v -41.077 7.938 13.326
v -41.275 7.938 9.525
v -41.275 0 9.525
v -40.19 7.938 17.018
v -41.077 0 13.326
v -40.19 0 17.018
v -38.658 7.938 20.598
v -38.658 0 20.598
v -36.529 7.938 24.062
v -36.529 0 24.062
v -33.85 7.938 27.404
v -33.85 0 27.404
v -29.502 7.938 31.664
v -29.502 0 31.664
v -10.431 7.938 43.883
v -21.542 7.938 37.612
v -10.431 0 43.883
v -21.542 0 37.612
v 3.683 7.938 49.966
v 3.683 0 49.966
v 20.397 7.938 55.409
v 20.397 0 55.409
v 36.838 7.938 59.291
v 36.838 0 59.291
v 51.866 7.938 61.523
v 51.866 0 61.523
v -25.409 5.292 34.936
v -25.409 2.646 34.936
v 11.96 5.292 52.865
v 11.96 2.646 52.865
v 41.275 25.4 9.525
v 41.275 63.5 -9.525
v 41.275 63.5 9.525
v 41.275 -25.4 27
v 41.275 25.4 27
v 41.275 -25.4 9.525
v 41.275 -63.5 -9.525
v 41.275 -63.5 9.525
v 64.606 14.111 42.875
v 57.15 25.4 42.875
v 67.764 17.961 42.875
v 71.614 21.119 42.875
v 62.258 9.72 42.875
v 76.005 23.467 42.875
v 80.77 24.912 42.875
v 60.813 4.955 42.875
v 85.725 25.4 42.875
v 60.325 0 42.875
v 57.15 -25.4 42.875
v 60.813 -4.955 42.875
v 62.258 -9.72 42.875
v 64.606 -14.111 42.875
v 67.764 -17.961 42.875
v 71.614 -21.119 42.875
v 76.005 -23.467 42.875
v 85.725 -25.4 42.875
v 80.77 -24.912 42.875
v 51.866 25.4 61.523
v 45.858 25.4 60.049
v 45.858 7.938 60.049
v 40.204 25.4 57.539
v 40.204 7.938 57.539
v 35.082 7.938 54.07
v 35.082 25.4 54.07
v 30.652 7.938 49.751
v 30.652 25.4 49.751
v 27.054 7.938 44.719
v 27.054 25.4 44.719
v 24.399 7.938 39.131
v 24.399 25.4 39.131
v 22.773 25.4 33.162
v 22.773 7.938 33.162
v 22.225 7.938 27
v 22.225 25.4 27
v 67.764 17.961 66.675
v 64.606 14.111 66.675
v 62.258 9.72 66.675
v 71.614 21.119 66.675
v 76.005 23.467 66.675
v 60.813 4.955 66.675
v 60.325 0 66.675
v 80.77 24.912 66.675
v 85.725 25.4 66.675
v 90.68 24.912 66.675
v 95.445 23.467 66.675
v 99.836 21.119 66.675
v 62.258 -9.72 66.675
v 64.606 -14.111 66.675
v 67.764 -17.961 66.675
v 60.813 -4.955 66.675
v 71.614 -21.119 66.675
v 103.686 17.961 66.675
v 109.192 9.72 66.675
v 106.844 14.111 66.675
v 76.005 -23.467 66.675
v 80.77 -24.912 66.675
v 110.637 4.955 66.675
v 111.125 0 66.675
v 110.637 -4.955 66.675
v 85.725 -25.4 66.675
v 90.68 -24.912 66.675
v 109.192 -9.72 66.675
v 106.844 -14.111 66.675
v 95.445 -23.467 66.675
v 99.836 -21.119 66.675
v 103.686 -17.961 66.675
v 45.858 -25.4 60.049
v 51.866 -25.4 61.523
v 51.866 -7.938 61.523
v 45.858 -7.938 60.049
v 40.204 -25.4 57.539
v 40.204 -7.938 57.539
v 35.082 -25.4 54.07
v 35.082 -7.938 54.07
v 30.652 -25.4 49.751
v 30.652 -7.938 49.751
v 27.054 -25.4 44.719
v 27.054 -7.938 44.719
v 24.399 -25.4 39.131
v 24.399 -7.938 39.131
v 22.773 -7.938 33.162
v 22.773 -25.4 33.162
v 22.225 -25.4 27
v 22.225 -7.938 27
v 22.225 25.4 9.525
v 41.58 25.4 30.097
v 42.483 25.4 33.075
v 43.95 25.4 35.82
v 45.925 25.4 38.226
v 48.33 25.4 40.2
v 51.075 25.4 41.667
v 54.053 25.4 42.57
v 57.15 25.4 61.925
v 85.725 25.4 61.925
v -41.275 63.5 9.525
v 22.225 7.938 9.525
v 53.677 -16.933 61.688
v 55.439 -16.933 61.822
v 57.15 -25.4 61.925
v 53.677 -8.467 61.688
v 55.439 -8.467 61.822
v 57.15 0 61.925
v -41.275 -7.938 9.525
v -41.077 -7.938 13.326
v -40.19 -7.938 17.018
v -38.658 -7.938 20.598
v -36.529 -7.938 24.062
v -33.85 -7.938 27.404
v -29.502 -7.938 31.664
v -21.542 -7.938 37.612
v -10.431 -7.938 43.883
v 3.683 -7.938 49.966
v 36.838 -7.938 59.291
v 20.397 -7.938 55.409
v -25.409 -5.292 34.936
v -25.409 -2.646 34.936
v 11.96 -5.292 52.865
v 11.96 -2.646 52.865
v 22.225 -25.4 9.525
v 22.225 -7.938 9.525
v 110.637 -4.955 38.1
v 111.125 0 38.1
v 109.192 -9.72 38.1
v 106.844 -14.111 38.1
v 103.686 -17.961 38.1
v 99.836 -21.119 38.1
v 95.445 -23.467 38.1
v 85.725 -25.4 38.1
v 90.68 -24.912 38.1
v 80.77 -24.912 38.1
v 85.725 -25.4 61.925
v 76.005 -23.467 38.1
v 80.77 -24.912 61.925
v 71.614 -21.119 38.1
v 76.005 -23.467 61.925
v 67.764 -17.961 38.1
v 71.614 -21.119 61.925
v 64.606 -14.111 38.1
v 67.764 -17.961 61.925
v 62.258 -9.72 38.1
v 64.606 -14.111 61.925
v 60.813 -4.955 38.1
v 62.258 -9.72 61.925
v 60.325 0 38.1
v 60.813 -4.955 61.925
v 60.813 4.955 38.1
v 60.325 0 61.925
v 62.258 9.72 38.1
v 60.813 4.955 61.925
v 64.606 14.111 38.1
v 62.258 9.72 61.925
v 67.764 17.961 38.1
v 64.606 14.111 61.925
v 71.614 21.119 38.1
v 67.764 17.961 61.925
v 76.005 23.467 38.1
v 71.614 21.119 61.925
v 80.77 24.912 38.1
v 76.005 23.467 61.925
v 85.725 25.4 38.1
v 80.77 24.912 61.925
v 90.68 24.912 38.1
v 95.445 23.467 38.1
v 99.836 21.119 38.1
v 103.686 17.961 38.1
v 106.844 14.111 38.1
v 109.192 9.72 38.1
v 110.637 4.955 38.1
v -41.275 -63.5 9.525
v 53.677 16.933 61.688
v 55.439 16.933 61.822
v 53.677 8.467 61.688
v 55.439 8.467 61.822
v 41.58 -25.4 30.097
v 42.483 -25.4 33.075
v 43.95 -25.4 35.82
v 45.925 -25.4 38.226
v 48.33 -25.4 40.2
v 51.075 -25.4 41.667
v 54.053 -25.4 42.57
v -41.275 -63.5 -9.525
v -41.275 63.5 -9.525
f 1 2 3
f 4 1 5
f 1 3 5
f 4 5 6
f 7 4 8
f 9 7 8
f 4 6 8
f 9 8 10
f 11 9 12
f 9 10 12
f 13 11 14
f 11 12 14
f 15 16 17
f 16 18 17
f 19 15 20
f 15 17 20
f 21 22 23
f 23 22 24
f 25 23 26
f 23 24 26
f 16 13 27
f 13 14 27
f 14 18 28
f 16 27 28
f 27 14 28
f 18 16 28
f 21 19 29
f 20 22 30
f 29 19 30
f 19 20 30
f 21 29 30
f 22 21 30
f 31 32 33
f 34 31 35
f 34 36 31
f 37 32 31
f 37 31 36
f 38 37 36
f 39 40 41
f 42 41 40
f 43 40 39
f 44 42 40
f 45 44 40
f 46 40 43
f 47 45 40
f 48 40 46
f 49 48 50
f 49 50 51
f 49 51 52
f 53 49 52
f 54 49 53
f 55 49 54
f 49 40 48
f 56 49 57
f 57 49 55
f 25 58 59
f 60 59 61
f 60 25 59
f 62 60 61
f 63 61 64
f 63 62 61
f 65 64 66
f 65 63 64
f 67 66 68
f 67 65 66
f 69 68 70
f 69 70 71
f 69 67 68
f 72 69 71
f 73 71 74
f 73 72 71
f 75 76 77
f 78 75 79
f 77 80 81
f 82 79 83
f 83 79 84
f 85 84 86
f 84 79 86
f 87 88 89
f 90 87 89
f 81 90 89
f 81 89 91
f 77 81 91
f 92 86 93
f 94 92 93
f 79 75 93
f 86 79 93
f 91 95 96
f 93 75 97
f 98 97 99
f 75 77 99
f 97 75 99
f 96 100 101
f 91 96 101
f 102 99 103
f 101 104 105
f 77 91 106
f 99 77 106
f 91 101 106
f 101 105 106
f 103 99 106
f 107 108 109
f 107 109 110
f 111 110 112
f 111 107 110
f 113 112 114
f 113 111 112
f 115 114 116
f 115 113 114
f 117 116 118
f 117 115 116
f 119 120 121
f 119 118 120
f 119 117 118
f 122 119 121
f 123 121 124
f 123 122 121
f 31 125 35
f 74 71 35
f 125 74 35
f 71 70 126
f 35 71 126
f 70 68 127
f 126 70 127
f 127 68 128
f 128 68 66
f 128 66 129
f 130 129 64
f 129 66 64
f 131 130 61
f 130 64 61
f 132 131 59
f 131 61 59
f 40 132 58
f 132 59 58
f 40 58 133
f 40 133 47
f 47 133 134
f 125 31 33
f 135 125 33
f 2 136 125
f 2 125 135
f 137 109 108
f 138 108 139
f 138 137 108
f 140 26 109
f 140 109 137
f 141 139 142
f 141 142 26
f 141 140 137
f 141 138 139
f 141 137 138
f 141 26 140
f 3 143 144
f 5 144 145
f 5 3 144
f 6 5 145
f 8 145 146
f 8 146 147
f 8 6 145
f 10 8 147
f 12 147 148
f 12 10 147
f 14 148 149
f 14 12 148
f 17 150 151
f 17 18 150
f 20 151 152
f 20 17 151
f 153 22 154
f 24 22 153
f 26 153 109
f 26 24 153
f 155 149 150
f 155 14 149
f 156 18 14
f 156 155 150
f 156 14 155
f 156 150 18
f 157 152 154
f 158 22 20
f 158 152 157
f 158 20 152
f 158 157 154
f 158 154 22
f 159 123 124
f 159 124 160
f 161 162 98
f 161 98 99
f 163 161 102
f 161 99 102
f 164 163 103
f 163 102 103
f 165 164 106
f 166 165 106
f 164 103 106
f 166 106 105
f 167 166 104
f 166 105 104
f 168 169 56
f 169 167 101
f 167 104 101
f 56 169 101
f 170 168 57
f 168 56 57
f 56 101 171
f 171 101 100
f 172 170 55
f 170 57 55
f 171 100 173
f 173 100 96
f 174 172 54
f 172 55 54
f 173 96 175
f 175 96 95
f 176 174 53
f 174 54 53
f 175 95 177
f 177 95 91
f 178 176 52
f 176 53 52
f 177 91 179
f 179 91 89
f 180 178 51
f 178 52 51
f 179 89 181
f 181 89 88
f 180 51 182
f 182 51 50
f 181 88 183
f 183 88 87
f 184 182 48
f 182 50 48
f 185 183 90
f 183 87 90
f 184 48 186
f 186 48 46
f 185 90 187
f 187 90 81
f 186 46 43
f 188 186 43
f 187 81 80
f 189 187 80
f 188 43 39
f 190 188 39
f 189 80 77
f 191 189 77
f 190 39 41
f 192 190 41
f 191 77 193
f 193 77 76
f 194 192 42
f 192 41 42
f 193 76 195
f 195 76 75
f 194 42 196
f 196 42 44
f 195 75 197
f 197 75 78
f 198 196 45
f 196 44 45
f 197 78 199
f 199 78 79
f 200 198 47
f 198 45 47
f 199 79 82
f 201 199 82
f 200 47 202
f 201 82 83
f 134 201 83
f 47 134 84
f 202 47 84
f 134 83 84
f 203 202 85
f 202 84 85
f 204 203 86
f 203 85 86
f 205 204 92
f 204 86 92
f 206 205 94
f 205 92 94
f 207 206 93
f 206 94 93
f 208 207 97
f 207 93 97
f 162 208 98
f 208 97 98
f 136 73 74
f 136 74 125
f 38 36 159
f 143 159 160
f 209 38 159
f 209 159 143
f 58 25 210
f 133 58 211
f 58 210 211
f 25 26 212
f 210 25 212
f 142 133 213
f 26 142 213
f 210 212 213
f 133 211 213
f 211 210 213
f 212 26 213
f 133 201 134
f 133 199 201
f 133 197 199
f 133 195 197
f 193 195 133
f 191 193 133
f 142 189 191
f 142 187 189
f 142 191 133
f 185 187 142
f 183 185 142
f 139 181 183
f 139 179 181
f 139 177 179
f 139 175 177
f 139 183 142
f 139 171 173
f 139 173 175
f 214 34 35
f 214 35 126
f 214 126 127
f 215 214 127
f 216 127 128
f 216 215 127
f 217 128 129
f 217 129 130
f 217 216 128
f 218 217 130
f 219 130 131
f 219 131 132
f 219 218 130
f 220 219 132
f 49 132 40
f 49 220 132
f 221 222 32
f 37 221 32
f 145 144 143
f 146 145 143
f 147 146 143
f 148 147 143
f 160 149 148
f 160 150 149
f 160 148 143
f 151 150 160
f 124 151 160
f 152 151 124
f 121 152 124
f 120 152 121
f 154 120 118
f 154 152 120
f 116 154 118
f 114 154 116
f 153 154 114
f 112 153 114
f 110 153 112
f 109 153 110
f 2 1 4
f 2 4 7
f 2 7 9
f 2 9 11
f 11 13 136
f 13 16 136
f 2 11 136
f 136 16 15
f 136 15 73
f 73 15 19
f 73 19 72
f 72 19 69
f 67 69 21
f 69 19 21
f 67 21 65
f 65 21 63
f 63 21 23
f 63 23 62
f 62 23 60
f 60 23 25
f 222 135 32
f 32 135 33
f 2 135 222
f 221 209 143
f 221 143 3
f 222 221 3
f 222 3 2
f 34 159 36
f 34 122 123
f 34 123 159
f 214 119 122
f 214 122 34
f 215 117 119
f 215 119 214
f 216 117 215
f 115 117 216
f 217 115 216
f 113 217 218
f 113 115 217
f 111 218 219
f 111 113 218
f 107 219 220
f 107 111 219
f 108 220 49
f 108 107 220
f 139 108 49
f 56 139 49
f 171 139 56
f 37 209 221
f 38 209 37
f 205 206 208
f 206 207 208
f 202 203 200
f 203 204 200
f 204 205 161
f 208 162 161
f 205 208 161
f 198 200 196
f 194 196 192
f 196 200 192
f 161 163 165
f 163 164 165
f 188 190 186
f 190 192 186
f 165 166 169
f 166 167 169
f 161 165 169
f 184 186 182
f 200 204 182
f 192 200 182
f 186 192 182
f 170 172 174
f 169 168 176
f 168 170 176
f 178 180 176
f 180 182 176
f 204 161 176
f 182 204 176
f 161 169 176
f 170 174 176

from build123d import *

# Parameters (mm, degrees)
F1_DEPTH = 63.5
F2_DEPTH = 7.9375
F0_W     = 25.4
F0_H     = 19.05
F3_DEPTH = 25.4


with BuildPart() as f1:
    # F0 (on Front) → F1 (new body, symmetric)
    with BuildSketch(Plane.XZ):
        Polygon((41.275, -9.525), (41.275, 9.525), (22.225, 9.525), (-41.275, 9.525), (-41.275, -9.525), align=None)
    extrude(amount=F1_DEPTH, both=True)

    # F0 (on Front) → F2 (join, symmetric)
    with BuildSketch(Plane.XZ):
        with BuildLine():
            Line((-41.275, 9.525), (22.225, 9.525))
            Line((22.225, 9.525), (22.225, 27.0002))
            ThreePointArc((22.225, 27.0002), (30.6519829848, 49.7512597394), (51.8662723988, 61.5232046148))
            add(Edge.make_bspline(
                [(-41.275, 9.525), (-42.4839697901, 38.0803204512), (17.0147305919, 58.0960971438), (51.8662723988, 61.5232046148)],
                knots=[0, 0, 0, 0, 105.9312779521, 105.9312779521, 105.9312779521, 105.9312779521], degree=3))
        make_face()
    extrude(amount=F2_DEPTH, both=True)

    # F0 (on Front) → F3 (join, symmetric)
    with BuildSketch(Plane.XZ):
        with BuildLine():
            Line((22.225, 9.525), (41.275, 9.525))
            Line((41.275, 9.525), (41.275, 27.0002))
            ThreePointArc((41.275, 27.0002), (45.9246798487, 38.2255201513), (57.15, 42.8752))
            Line((57.15, 42.8752), (60.325, 42.8752))
            Line((60.325, 42.8752), (60.325, 61.9252))
            Line((60.325, 61.9252), (57.15, 61.9252))
            add(Edge.make_bspline(
                [(51.8662723988, 61.5232046148), (53.6998823137, 61.7035116518), (55.4652682936, 61.8379008486), (57.15, 61.9252)],
                knots=[105.9312779521, 105.9312779521, 105.9312779521, 105.9312779521, 111.5045361635, 111.5045361635, 111.5045361635, 111.5045361635], degree=3))
            ThreePointArc((51.8662723988, 61.5232046148), (30.6519829848, 49.7512597394), (22.225, 27.0002))
            Line((22.225, 27.0002), (22.225, 9.525))
        make_face()
        with Locations((73.025, 52.4002)):
            Rectangle(F0_W, F0_H)
    extrude(amount=F3_DEPTH, both=True)

    # F0 (on Front) → F4 (revolve)
    with BuildSketch(Plane.XZ):
        Polygon((85.725, 61.9252), (85.725, 42.8752), (85.725, 38.1), (111.125, 38.1), (111.125, 66.675), (85.725, 66.675), align=None)
    revolve(axis=Axis((85.725, 0, 52.3875), (0, 0, -1)))


solid = f1.part
